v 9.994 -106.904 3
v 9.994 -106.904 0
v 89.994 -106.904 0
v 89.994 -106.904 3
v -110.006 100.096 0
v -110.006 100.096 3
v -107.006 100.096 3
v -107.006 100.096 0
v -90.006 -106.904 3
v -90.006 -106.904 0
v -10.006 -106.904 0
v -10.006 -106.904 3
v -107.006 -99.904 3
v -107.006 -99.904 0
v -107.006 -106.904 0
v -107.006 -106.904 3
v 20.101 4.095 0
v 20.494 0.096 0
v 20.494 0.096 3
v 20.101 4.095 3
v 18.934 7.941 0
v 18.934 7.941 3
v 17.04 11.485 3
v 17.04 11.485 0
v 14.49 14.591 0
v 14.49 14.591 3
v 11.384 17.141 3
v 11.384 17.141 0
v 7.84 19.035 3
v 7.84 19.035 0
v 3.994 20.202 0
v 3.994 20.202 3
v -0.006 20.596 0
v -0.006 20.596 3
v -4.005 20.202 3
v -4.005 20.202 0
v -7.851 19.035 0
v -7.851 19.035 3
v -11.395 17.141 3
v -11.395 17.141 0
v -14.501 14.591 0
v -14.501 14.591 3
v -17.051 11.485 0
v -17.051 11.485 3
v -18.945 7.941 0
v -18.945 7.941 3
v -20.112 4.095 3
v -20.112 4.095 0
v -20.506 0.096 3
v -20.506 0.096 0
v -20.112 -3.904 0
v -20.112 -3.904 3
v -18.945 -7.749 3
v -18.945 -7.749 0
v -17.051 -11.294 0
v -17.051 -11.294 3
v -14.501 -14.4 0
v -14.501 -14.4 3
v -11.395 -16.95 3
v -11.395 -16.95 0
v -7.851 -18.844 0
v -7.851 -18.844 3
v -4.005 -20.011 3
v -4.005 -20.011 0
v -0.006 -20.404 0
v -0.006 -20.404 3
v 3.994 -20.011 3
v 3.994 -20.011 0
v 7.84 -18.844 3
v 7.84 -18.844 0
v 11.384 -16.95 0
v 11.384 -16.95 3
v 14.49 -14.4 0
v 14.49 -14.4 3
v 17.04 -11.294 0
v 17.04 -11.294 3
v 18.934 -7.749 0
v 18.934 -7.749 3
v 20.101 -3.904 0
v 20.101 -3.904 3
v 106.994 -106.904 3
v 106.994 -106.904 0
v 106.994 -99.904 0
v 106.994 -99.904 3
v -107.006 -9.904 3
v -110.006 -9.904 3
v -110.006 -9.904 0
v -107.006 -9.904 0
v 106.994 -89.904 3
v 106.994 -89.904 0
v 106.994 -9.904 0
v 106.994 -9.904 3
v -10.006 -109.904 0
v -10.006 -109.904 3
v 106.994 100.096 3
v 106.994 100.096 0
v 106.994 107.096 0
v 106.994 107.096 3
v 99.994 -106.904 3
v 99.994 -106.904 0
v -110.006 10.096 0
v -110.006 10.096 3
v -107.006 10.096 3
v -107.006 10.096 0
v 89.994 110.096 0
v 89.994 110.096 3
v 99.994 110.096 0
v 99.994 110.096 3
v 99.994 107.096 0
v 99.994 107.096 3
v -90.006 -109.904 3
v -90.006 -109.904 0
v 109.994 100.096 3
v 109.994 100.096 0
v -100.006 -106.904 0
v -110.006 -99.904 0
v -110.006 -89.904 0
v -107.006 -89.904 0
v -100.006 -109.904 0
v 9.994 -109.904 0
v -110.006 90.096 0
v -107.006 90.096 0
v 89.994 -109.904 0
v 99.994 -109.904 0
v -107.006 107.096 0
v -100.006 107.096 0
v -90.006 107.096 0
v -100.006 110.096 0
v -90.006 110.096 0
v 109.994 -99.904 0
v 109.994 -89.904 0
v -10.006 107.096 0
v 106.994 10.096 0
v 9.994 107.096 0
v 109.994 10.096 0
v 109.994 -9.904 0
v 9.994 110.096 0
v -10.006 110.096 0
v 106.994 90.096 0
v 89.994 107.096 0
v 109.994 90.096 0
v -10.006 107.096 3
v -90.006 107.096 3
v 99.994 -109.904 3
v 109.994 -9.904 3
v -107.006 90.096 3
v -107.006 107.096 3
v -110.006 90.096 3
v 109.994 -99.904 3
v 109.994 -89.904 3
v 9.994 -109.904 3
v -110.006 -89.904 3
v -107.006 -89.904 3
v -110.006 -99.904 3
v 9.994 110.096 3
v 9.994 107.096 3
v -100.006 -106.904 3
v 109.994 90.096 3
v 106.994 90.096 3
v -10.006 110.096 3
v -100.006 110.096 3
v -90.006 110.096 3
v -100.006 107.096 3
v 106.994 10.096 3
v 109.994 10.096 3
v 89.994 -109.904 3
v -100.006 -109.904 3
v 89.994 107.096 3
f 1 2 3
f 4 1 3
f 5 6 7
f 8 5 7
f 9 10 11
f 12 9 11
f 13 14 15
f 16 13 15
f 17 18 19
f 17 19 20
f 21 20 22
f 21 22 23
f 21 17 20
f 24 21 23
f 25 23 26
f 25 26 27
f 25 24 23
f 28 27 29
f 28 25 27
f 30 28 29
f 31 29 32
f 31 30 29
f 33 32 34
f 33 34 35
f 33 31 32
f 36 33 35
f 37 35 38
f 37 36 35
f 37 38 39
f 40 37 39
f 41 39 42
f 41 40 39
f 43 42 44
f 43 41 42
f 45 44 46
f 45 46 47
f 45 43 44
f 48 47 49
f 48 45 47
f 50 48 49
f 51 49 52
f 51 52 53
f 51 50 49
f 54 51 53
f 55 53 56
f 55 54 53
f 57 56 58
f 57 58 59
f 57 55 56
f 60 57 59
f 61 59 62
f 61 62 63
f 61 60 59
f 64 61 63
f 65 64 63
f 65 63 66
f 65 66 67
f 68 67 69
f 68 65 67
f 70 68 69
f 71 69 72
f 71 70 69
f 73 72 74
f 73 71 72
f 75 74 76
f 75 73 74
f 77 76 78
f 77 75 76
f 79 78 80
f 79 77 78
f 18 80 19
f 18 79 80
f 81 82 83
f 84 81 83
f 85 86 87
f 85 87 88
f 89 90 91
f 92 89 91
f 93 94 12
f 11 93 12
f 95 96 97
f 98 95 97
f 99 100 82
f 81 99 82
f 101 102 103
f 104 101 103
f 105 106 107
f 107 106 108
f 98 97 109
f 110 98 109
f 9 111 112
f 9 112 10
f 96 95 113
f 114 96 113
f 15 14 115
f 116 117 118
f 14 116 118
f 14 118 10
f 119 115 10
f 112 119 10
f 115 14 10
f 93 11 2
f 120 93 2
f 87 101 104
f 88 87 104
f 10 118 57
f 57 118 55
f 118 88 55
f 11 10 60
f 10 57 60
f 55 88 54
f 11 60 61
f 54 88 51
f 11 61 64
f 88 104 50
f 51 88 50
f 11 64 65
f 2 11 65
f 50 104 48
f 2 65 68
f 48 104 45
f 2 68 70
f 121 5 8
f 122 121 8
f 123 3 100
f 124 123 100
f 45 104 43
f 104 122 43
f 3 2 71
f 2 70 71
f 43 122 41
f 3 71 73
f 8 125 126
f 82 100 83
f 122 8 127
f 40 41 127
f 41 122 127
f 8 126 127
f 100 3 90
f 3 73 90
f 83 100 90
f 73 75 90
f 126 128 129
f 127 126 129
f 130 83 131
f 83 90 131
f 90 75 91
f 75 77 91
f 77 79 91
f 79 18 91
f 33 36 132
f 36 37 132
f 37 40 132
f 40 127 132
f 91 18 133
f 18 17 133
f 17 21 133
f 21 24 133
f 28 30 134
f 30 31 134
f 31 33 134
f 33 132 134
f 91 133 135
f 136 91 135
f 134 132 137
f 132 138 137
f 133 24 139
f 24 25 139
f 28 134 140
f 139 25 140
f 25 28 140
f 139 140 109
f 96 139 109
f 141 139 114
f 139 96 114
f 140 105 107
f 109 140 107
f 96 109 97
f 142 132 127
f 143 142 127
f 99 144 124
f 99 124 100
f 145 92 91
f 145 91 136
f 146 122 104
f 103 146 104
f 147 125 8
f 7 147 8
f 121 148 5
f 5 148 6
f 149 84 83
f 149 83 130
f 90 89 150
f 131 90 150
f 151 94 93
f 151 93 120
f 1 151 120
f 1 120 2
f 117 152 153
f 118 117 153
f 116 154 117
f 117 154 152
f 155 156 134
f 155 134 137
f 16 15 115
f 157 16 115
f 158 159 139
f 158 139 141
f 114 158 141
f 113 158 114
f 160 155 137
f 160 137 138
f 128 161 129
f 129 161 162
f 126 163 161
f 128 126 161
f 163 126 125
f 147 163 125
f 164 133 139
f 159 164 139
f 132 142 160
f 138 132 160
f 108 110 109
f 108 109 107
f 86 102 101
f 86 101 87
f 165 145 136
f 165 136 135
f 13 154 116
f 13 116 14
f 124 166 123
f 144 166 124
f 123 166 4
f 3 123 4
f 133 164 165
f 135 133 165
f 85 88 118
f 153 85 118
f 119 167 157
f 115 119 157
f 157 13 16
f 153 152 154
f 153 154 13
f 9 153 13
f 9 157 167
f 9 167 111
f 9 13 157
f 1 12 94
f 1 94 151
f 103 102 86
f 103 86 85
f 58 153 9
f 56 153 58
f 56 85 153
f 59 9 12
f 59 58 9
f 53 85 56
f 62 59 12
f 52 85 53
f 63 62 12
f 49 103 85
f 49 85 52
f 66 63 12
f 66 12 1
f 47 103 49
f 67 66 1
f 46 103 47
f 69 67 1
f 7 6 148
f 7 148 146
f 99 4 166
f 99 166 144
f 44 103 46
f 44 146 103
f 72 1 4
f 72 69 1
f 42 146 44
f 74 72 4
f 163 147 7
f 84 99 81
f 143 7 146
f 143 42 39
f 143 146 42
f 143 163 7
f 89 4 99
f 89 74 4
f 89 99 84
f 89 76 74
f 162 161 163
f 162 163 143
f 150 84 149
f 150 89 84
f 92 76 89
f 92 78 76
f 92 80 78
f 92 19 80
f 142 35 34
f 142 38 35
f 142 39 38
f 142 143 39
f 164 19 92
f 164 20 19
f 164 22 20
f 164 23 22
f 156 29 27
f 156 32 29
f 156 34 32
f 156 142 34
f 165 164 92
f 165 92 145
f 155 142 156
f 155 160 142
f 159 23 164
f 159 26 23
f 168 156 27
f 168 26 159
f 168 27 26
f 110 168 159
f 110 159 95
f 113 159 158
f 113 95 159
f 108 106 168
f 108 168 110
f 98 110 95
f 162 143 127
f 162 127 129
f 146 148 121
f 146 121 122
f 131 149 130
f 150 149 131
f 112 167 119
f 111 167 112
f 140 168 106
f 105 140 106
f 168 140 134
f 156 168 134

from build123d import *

# Parameters (mm, degrees)
F0_R     = 20.5
F1_DEPTH = 3
F2_W     = 10
F2_H     = 3
F2_W_2   = 3
F2_H_2   = 10
F3_DEPTH = 3


with BuildPart() as f1:
    # F0 (on Top) → F1 (new body)
    with BuildSketch(Plane.XY):
        Polygon((-85.136861, 107.09559), (-107.005506, 107.09559), (-107.005506, -106.90441), (106.994494, -106.90441), (106.994494, 107.09559), align=None)
        with Locations((-0.005506, 0.09559)):
            Circle(F0_R, mode=Mode.SUBTRACT)
    extrude(amount=F1_DEPTH)

    # F2 (on face) → F3 (join)
    with BuildSketch(Plane.XY.offset(3)):
        with Locations((-5.005506, 108.59559)):
            Rectangle(F2_W, F2_H)
        with Locations((4.994494, 108.59559)):
            Rectangle(F2_W, F2_H)
        with Locations((-95.005506, 108.59559)):
            Rectangle(F2_W, F2_H)
        with Locations((94.994494, 108.59559)):
            Rectangle(F2_W, F2_H)
        with Locations((4.994494, -108.40441)):
            Rectangle(F2_W, F2_H)
        with Locations((-5.005506, -108.40441)):
            Rectangle(F2_W, F2_H)
        with Locations((-95.005506, -108.40441)):
            Rectangle(F2_W, F2_H)
        with Locations((94.994494, -108.40441)):
            Rectangle(F2_W, F2_H)
        with Locations((-108.505506, -4.90441)):
            Rectangle(F2_W_2, F2_H_2)
        with Locations((-108.505506, 5.09559)):
            Rectangle(F2_W_2, F2_H_2)
        with Locations((-108.505506, -94.90441)):
            Rectangle(F2_W_2, F2_H_2)
        with Locations((-108.505506, 95.09559)):
            Rectangle(F2_W_2, F2_H_2)
        with Locations((108.494494, 5.09559)):
            Rectangle(F2_W_2, F2_H_2)
        with Locations((108.494494, -4.90441)):
            Rectangle(F2_W_2, F2_H_2)
        with Locations((108.494494, 95.09559)):
            Rectangle(F2_W_2, F2_H_2)
        with Locations((108.494494, -94.90441)):
            Rectangle(F2_W_2, F2_H_2)
    extrude(amount=-F3_DEPTH)


solid = f1.part
